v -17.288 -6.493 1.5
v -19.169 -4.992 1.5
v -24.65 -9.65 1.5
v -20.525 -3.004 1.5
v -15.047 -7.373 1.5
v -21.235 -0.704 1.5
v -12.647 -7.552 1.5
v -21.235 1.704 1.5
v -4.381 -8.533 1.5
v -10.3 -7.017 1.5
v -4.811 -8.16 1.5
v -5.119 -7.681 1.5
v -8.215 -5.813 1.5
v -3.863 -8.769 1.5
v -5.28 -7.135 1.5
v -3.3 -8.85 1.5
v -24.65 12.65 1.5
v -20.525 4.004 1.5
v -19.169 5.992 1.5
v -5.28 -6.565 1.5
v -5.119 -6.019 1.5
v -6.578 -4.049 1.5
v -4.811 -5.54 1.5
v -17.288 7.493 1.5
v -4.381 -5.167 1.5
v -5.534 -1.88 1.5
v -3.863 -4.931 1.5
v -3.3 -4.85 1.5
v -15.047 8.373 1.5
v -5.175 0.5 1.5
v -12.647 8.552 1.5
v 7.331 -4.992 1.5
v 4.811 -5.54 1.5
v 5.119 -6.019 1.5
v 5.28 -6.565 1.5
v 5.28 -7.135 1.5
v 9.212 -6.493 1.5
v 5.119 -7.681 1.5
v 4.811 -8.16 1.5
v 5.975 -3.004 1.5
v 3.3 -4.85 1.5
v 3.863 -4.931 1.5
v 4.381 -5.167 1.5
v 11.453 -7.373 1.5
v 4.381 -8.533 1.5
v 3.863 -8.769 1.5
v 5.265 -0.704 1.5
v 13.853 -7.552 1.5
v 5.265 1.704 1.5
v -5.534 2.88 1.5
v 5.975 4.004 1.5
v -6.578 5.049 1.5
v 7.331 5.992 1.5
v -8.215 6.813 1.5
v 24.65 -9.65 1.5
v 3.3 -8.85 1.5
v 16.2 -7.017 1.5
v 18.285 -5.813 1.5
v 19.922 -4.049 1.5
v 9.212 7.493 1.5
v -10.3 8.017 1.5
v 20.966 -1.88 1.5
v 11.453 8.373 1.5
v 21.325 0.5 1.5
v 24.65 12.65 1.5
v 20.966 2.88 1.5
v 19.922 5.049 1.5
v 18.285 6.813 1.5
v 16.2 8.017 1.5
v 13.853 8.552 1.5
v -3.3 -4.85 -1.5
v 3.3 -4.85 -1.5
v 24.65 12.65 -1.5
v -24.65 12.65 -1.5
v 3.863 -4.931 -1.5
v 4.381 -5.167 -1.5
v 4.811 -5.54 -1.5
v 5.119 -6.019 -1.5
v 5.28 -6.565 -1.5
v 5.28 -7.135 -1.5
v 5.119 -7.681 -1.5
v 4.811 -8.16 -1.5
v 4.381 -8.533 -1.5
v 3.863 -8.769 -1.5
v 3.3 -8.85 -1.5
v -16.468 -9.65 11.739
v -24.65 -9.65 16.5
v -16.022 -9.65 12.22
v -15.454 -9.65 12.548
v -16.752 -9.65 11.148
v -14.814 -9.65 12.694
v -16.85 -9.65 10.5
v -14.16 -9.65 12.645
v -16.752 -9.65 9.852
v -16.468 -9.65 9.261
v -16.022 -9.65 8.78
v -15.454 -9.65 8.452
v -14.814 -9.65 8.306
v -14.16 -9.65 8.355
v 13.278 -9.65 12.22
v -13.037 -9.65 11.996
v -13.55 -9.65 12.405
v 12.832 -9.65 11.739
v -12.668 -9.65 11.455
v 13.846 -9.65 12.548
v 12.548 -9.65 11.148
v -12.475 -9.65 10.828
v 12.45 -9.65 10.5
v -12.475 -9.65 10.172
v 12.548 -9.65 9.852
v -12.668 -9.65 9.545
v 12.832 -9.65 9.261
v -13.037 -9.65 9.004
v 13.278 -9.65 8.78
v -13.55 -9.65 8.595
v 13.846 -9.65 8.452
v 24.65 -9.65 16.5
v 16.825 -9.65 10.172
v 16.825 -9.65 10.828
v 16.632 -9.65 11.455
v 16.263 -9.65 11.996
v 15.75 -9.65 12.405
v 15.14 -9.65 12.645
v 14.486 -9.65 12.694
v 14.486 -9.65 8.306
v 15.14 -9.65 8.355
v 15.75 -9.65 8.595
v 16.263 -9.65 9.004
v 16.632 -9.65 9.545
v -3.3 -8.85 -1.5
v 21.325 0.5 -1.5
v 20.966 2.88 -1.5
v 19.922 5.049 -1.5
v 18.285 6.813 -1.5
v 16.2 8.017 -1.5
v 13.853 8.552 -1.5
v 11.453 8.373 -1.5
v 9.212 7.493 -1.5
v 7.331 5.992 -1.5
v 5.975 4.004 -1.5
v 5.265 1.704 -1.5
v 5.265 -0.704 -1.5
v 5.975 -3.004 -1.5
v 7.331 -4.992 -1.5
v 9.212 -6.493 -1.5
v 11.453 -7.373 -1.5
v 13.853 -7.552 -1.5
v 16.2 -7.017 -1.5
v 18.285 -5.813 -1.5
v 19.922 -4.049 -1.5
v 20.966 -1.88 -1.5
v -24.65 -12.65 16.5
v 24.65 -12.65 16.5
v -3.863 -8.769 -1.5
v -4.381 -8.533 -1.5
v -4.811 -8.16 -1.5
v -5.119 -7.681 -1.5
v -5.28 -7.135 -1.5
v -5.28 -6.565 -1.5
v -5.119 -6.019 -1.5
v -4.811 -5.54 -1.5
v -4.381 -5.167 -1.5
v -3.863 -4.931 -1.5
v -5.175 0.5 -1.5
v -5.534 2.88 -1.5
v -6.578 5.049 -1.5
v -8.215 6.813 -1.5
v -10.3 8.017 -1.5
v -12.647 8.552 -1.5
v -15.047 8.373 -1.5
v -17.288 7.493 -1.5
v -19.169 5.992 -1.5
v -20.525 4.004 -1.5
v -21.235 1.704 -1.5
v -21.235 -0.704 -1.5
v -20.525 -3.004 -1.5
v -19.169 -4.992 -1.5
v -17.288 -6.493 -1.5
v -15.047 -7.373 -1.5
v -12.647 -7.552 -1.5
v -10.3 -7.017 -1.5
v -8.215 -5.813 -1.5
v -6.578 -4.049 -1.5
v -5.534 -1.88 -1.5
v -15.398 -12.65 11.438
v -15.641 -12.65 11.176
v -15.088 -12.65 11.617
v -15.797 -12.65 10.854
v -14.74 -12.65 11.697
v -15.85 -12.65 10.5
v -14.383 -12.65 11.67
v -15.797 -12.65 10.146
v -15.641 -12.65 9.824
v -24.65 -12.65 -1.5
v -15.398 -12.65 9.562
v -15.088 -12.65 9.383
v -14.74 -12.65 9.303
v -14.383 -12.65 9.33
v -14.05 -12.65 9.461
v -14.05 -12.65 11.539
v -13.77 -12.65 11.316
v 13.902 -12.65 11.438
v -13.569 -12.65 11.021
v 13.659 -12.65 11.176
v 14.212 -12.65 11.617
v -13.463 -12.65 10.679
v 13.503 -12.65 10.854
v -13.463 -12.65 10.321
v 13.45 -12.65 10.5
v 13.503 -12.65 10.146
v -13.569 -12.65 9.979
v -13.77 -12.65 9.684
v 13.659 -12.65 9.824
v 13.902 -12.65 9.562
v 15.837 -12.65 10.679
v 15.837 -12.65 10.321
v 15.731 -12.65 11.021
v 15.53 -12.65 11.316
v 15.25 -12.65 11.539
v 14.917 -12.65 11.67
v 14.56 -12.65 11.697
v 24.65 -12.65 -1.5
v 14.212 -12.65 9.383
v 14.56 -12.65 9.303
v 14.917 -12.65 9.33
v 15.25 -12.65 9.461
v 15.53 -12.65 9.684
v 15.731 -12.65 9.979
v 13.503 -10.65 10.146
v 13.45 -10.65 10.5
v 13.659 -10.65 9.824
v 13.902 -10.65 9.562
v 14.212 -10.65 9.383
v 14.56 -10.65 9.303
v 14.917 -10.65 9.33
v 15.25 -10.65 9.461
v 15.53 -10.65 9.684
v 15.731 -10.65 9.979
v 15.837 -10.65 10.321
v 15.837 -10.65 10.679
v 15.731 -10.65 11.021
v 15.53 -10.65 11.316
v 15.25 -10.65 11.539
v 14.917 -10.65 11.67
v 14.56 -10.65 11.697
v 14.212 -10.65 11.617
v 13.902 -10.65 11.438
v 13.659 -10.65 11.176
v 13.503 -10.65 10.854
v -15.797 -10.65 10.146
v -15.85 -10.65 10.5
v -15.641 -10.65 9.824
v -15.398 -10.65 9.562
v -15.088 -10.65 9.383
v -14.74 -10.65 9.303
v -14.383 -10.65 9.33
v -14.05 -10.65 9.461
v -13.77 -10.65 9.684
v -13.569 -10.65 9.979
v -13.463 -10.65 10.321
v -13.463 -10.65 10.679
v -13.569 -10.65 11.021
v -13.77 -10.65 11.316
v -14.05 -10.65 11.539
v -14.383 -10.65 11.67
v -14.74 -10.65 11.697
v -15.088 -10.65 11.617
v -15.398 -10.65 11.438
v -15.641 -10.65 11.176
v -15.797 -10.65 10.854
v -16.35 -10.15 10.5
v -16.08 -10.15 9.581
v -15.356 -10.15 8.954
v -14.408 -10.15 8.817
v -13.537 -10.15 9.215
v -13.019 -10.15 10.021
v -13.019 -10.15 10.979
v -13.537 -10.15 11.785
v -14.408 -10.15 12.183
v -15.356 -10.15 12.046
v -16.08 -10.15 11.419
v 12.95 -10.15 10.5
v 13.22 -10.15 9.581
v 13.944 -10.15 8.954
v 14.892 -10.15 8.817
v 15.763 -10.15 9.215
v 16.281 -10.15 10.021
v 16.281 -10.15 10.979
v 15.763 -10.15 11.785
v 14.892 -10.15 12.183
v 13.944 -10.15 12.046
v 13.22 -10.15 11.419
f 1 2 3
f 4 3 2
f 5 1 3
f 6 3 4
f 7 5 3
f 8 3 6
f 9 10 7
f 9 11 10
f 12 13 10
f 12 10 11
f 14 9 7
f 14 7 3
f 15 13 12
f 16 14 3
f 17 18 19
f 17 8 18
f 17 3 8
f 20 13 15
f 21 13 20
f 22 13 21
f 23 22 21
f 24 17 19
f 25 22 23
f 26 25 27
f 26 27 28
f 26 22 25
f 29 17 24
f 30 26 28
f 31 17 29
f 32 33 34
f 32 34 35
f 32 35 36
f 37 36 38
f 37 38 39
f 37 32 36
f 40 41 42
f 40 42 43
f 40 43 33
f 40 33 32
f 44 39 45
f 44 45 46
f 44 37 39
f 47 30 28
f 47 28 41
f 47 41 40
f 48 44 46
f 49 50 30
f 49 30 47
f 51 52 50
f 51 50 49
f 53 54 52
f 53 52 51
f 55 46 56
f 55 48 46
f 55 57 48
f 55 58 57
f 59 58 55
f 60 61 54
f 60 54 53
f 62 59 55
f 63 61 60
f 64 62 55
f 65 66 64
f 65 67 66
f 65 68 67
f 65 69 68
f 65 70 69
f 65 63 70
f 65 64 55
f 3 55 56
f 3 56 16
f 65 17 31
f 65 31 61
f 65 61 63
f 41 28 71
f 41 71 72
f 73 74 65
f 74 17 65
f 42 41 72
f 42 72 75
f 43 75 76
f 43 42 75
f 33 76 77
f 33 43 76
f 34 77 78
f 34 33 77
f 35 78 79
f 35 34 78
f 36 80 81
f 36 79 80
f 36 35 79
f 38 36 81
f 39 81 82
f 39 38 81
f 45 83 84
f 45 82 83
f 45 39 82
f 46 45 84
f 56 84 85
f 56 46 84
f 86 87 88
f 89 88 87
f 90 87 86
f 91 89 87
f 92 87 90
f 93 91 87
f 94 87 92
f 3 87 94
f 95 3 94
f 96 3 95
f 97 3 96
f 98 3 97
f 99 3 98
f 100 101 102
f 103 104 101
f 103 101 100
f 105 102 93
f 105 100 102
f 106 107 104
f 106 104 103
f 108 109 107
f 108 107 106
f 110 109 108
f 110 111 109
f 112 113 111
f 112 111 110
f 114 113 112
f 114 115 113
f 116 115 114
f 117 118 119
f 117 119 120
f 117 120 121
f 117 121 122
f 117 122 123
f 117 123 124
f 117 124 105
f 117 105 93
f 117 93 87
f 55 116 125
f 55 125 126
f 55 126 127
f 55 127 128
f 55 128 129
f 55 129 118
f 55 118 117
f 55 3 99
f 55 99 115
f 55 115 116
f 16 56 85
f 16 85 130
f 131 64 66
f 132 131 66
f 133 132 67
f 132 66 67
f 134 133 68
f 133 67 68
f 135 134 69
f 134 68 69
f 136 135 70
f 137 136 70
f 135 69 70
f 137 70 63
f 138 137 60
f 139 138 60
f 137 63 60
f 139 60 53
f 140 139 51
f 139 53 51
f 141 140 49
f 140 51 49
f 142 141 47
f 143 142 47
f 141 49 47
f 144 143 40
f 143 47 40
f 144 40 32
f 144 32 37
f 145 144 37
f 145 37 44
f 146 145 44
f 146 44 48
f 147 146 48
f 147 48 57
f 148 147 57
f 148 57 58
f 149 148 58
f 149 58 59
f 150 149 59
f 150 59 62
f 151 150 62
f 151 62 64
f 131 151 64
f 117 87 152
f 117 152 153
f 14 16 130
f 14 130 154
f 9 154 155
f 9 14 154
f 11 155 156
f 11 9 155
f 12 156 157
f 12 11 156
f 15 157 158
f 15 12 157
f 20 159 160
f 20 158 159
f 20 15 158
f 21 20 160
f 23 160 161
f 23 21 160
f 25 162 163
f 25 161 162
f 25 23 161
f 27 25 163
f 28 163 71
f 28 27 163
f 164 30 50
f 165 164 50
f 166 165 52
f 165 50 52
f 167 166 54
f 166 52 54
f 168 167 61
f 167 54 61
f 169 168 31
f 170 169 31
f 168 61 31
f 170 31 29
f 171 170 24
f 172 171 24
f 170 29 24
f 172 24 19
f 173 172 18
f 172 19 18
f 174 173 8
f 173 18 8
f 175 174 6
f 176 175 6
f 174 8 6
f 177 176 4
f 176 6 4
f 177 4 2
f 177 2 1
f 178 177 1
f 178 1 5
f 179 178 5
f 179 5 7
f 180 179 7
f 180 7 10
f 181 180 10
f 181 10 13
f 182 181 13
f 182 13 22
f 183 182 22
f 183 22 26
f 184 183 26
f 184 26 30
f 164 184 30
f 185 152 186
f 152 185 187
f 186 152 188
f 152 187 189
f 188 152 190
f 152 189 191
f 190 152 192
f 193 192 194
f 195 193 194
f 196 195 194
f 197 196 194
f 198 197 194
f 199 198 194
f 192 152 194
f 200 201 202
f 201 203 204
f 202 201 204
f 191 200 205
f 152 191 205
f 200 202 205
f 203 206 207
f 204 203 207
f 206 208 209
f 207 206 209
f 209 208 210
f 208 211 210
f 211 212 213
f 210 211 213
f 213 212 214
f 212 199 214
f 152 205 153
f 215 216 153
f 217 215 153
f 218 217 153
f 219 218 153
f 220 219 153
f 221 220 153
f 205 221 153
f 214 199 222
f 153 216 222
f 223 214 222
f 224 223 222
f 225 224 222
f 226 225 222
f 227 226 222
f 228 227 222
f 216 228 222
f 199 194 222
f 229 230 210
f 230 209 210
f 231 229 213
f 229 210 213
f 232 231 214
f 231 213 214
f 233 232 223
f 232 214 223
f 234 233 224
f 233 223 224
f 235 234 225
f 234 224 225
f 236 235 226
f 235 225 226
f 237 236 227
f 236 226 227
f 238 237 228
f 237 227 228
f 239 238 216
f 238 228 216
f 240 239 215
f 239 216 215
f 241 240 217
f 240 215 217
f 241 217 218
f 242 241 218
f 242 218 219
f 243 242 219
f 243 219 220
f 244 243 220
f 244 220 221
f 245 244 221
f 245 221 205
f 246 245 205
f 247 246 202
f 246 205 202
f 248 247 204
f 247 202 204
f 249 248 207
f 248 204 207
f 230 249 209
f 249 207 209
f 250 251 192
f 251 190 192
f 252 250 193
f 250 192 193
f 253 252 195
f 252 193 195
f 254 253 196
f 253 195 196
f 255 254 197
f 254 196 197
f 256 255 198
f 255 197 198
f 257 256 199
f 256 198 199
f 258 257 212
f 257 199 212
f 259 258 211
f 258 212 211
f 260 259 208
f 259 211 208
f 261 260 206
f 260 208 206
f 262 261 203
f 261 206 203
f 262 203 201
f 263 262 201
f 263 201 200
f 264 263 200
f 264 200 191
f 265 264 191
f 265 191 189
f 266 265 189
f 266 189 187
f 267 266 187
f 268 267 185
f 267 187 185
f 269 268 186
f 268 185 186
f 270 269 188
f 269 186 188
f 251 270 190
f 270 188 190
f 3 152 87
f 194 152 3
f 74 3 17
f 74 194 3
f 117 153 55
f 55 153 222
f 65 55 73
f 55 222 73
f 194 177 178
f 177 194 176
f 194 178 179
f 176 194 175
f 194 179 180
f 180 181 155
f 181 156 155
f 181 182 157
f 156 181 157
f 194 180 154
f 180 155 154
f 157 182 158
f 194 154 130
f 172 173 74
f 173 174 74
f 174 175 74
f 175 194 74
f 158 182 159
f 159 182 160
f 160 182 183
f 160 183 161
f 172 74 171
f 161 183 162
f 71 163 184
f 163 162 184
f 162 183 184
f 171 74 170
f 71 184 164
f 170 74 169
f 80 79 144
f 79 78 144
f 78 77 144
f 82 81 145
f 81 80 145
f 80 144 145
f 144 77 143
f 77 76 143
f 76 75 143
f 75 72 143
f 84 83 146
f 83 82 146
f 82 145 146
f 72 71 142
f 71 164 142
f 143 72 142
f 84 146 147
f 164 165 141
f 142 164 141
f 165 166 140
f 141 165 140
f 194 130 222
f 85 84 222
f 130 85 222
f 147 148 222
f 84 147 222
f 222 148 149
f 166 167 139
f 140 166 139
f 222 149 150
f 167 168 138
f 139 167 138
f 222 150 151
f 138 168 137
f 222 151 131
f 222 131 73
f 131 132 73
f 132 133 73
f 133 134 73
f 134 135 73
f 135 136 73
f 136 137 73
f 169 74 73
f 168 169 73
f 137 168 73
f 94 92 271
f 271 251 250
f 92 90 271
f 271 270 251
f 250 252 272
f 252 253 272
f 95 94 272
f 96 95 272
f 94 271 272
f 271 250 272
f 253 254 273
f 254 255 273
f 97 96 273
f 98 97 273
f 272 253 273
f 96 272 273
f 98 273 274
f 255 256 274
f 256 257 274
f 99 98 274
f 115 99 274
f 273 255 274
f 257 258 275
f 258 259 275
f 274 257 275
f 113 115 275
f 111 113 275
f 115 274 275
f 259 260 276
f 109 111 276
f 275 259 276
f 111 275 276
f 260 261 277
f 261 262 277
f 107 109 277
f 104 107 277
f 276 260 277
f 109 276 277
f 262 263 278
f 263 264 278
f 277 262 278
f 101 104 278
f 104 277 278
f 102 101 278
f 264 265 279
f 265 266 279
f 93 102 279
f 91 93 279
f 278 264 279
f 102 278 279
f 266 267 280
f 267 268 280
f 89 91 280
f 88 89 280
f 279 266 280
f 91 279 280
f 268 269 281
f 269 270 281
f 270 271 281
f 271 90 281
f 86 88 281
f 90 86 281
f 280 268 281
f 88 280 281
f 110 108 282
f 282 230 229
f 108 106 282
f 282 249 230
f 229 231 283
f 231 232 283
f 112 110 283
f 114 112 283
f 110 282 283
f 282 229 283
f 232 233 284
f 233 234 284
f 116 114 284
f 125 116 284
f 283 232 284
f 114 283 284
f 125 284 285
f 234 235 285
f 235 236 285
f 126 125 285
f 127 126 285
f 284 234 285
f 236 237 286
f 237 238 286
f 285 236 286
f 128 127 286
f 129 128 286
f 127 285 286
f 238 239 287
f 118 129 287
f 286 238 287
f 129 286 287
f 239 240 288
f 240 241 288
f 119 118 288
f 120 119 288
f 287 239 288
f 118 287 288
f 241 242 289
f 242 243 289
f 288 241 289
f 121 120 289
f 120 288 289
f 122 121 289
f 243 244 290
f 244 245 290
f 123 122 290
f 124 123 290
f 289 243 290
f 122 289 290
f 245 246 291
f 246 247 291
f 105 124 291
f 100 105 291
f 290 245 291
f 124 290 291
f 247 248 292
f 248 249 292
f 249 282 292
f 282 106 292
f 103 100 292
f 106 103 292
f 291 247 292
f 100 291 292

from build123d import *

# Parameters (mm, degrees)
SKETCH1_W                                           = 49.3
SKETCH1_H                                           = 25.3
BOSS_EXTRUDE1_DEPTH                                 = 1.5
SKETCH4_W                                           = 49.3
SKETCH4_H                                           = 3
BOSS_EXTRUDE2_DEPTH                                 = 15
CSK_FOR_M2_COUNTERSUNK_FLAT_HEAD_SCREW1_D           = 2.4
CSK_FOR_M2_COUNTERSUNK_FLAT_HEAD_SCREW1_CSINK_D     = 4.4
CSK_FOR_M2_COUNTERSUNK_FLAT_HEAD_SCREW1_CSINK_ANGLE = 90
CUT_EXTRUDE1_REACH                                  = 33.506
SKETCH8_R                                           = 8.075


with BuildPart() as part:
    # Sketch1 → Boss-Extrude1 (new, symmetric)
    with BuildSketch(Plane.XY):
        Rectangle(SKETCH1_W, SKETCH1_H)
    extrude(amount=BOSS_EXTRUDE1_DEPTH, both=True)

    # Sketch4 → Boss-Extrude2 (add)
    with BuildSketch(Plane.XY.offset(1.5)):
        with Locations((0, -11.15)):
            Rectangle(SKETCH4_W, SKETCH4_H)
    extrude(amount=BOSS_EXTRUDE2_DEPTH)

    # CSK for M2 Countersunk Flat Head Screw1 (through all)
    with Locations(Plane(origin=(0, -9.65, 0), x_dir=(1, 0, 0), z_dir=(0, 1, 0))):
        with Locations((-14.65, -10.5), (14.65, -10.5)):
            CounterSinkHole(CSK_FOR_M2_COUNTERSUNK_FLAT_HEAD_SCREW1_D / 2, CSK_FOR_M2_COUNTERSUNK_FLAT_HEAD_SCREW1_CSINK_D / 2, counter_sink_angle=CSK_FOR_M2_COUNTERSUNK_FLAT_HEAD_SCREW1_CSINK_ANGLE)

    # Sketch8 → Cut-Extrude1 (cut, up to next)
    with BuildSketch(Plane.XY.offset(1.5), mode=Mode.PRIVATE) as cut_extrude1_sk1:
        with Locations((-13.25, 0.5)):
            Circle(SKETCH8_R)
    cut_extrude1_tool1 = extrude(cut_extrude1_sk1.sketch, amount=-CUT_EXTRUDE1_REACH, mode=Mode.PRIVATE) & part.part
    # Sketch8 → Cut-Extrude1 (cut, up to next)
    with BuildSketch(Plane.XY.offset(1.5), mode=Mode.PRIVATE) as cut_extrude1_sk2:
        with Locations((13.25, 0.5)):
            Circle(SKETCH8_R)
    cut_extrude1_tool2 = extrude(cut_extrude1_sk2.sketch, amount=-CUT_EXTRUDE1_REACH, mode=Mode.PRIVATE) & part.part
    # Sketch8 → Cut-Extrude1 (cut, up to next)
    with BuildSketch(Plane.XY.offset(1.5), mode=Mode.PRIVATE) as cut_extrude1_sk3:
        with BuildLine():
            Line((-3.3, -4.85), (3.3, -4.85))
            ThreePointArc((3.3, -4.85), (5.3, -6.85), (3.3, -8.85))
            Line((3.3, -8.85), (-3.3, -8.85))
            ThreePointArc((-3.3, -8.85), (-5.3, -6.85), (-3.3, -4.85))
        make_face()
    cut_extrude1_tool3 = extrude(cut_extrude1_sk3.sketch, amount=-CUT_EXTRUDE1_REACH, mode=Mode.PRIVATE) & part.part
    add(cut_extrude1_tool1.solids().sort_by_distance((-13.25, 0.5, 1.5))[0], mode=Mode.SUBTRACT)
    add(cut_extrude1_tool2.solids().sort_by_distance((13.25, 0.5, 1.5))[0], mode=Mode.SUBTRACT)
    add(cut_extrude1_tool3.solids().sort_by_distance((0, -6.85, 1.5))[0], mode=Mode.SUBTRACT)


solid = part.part
